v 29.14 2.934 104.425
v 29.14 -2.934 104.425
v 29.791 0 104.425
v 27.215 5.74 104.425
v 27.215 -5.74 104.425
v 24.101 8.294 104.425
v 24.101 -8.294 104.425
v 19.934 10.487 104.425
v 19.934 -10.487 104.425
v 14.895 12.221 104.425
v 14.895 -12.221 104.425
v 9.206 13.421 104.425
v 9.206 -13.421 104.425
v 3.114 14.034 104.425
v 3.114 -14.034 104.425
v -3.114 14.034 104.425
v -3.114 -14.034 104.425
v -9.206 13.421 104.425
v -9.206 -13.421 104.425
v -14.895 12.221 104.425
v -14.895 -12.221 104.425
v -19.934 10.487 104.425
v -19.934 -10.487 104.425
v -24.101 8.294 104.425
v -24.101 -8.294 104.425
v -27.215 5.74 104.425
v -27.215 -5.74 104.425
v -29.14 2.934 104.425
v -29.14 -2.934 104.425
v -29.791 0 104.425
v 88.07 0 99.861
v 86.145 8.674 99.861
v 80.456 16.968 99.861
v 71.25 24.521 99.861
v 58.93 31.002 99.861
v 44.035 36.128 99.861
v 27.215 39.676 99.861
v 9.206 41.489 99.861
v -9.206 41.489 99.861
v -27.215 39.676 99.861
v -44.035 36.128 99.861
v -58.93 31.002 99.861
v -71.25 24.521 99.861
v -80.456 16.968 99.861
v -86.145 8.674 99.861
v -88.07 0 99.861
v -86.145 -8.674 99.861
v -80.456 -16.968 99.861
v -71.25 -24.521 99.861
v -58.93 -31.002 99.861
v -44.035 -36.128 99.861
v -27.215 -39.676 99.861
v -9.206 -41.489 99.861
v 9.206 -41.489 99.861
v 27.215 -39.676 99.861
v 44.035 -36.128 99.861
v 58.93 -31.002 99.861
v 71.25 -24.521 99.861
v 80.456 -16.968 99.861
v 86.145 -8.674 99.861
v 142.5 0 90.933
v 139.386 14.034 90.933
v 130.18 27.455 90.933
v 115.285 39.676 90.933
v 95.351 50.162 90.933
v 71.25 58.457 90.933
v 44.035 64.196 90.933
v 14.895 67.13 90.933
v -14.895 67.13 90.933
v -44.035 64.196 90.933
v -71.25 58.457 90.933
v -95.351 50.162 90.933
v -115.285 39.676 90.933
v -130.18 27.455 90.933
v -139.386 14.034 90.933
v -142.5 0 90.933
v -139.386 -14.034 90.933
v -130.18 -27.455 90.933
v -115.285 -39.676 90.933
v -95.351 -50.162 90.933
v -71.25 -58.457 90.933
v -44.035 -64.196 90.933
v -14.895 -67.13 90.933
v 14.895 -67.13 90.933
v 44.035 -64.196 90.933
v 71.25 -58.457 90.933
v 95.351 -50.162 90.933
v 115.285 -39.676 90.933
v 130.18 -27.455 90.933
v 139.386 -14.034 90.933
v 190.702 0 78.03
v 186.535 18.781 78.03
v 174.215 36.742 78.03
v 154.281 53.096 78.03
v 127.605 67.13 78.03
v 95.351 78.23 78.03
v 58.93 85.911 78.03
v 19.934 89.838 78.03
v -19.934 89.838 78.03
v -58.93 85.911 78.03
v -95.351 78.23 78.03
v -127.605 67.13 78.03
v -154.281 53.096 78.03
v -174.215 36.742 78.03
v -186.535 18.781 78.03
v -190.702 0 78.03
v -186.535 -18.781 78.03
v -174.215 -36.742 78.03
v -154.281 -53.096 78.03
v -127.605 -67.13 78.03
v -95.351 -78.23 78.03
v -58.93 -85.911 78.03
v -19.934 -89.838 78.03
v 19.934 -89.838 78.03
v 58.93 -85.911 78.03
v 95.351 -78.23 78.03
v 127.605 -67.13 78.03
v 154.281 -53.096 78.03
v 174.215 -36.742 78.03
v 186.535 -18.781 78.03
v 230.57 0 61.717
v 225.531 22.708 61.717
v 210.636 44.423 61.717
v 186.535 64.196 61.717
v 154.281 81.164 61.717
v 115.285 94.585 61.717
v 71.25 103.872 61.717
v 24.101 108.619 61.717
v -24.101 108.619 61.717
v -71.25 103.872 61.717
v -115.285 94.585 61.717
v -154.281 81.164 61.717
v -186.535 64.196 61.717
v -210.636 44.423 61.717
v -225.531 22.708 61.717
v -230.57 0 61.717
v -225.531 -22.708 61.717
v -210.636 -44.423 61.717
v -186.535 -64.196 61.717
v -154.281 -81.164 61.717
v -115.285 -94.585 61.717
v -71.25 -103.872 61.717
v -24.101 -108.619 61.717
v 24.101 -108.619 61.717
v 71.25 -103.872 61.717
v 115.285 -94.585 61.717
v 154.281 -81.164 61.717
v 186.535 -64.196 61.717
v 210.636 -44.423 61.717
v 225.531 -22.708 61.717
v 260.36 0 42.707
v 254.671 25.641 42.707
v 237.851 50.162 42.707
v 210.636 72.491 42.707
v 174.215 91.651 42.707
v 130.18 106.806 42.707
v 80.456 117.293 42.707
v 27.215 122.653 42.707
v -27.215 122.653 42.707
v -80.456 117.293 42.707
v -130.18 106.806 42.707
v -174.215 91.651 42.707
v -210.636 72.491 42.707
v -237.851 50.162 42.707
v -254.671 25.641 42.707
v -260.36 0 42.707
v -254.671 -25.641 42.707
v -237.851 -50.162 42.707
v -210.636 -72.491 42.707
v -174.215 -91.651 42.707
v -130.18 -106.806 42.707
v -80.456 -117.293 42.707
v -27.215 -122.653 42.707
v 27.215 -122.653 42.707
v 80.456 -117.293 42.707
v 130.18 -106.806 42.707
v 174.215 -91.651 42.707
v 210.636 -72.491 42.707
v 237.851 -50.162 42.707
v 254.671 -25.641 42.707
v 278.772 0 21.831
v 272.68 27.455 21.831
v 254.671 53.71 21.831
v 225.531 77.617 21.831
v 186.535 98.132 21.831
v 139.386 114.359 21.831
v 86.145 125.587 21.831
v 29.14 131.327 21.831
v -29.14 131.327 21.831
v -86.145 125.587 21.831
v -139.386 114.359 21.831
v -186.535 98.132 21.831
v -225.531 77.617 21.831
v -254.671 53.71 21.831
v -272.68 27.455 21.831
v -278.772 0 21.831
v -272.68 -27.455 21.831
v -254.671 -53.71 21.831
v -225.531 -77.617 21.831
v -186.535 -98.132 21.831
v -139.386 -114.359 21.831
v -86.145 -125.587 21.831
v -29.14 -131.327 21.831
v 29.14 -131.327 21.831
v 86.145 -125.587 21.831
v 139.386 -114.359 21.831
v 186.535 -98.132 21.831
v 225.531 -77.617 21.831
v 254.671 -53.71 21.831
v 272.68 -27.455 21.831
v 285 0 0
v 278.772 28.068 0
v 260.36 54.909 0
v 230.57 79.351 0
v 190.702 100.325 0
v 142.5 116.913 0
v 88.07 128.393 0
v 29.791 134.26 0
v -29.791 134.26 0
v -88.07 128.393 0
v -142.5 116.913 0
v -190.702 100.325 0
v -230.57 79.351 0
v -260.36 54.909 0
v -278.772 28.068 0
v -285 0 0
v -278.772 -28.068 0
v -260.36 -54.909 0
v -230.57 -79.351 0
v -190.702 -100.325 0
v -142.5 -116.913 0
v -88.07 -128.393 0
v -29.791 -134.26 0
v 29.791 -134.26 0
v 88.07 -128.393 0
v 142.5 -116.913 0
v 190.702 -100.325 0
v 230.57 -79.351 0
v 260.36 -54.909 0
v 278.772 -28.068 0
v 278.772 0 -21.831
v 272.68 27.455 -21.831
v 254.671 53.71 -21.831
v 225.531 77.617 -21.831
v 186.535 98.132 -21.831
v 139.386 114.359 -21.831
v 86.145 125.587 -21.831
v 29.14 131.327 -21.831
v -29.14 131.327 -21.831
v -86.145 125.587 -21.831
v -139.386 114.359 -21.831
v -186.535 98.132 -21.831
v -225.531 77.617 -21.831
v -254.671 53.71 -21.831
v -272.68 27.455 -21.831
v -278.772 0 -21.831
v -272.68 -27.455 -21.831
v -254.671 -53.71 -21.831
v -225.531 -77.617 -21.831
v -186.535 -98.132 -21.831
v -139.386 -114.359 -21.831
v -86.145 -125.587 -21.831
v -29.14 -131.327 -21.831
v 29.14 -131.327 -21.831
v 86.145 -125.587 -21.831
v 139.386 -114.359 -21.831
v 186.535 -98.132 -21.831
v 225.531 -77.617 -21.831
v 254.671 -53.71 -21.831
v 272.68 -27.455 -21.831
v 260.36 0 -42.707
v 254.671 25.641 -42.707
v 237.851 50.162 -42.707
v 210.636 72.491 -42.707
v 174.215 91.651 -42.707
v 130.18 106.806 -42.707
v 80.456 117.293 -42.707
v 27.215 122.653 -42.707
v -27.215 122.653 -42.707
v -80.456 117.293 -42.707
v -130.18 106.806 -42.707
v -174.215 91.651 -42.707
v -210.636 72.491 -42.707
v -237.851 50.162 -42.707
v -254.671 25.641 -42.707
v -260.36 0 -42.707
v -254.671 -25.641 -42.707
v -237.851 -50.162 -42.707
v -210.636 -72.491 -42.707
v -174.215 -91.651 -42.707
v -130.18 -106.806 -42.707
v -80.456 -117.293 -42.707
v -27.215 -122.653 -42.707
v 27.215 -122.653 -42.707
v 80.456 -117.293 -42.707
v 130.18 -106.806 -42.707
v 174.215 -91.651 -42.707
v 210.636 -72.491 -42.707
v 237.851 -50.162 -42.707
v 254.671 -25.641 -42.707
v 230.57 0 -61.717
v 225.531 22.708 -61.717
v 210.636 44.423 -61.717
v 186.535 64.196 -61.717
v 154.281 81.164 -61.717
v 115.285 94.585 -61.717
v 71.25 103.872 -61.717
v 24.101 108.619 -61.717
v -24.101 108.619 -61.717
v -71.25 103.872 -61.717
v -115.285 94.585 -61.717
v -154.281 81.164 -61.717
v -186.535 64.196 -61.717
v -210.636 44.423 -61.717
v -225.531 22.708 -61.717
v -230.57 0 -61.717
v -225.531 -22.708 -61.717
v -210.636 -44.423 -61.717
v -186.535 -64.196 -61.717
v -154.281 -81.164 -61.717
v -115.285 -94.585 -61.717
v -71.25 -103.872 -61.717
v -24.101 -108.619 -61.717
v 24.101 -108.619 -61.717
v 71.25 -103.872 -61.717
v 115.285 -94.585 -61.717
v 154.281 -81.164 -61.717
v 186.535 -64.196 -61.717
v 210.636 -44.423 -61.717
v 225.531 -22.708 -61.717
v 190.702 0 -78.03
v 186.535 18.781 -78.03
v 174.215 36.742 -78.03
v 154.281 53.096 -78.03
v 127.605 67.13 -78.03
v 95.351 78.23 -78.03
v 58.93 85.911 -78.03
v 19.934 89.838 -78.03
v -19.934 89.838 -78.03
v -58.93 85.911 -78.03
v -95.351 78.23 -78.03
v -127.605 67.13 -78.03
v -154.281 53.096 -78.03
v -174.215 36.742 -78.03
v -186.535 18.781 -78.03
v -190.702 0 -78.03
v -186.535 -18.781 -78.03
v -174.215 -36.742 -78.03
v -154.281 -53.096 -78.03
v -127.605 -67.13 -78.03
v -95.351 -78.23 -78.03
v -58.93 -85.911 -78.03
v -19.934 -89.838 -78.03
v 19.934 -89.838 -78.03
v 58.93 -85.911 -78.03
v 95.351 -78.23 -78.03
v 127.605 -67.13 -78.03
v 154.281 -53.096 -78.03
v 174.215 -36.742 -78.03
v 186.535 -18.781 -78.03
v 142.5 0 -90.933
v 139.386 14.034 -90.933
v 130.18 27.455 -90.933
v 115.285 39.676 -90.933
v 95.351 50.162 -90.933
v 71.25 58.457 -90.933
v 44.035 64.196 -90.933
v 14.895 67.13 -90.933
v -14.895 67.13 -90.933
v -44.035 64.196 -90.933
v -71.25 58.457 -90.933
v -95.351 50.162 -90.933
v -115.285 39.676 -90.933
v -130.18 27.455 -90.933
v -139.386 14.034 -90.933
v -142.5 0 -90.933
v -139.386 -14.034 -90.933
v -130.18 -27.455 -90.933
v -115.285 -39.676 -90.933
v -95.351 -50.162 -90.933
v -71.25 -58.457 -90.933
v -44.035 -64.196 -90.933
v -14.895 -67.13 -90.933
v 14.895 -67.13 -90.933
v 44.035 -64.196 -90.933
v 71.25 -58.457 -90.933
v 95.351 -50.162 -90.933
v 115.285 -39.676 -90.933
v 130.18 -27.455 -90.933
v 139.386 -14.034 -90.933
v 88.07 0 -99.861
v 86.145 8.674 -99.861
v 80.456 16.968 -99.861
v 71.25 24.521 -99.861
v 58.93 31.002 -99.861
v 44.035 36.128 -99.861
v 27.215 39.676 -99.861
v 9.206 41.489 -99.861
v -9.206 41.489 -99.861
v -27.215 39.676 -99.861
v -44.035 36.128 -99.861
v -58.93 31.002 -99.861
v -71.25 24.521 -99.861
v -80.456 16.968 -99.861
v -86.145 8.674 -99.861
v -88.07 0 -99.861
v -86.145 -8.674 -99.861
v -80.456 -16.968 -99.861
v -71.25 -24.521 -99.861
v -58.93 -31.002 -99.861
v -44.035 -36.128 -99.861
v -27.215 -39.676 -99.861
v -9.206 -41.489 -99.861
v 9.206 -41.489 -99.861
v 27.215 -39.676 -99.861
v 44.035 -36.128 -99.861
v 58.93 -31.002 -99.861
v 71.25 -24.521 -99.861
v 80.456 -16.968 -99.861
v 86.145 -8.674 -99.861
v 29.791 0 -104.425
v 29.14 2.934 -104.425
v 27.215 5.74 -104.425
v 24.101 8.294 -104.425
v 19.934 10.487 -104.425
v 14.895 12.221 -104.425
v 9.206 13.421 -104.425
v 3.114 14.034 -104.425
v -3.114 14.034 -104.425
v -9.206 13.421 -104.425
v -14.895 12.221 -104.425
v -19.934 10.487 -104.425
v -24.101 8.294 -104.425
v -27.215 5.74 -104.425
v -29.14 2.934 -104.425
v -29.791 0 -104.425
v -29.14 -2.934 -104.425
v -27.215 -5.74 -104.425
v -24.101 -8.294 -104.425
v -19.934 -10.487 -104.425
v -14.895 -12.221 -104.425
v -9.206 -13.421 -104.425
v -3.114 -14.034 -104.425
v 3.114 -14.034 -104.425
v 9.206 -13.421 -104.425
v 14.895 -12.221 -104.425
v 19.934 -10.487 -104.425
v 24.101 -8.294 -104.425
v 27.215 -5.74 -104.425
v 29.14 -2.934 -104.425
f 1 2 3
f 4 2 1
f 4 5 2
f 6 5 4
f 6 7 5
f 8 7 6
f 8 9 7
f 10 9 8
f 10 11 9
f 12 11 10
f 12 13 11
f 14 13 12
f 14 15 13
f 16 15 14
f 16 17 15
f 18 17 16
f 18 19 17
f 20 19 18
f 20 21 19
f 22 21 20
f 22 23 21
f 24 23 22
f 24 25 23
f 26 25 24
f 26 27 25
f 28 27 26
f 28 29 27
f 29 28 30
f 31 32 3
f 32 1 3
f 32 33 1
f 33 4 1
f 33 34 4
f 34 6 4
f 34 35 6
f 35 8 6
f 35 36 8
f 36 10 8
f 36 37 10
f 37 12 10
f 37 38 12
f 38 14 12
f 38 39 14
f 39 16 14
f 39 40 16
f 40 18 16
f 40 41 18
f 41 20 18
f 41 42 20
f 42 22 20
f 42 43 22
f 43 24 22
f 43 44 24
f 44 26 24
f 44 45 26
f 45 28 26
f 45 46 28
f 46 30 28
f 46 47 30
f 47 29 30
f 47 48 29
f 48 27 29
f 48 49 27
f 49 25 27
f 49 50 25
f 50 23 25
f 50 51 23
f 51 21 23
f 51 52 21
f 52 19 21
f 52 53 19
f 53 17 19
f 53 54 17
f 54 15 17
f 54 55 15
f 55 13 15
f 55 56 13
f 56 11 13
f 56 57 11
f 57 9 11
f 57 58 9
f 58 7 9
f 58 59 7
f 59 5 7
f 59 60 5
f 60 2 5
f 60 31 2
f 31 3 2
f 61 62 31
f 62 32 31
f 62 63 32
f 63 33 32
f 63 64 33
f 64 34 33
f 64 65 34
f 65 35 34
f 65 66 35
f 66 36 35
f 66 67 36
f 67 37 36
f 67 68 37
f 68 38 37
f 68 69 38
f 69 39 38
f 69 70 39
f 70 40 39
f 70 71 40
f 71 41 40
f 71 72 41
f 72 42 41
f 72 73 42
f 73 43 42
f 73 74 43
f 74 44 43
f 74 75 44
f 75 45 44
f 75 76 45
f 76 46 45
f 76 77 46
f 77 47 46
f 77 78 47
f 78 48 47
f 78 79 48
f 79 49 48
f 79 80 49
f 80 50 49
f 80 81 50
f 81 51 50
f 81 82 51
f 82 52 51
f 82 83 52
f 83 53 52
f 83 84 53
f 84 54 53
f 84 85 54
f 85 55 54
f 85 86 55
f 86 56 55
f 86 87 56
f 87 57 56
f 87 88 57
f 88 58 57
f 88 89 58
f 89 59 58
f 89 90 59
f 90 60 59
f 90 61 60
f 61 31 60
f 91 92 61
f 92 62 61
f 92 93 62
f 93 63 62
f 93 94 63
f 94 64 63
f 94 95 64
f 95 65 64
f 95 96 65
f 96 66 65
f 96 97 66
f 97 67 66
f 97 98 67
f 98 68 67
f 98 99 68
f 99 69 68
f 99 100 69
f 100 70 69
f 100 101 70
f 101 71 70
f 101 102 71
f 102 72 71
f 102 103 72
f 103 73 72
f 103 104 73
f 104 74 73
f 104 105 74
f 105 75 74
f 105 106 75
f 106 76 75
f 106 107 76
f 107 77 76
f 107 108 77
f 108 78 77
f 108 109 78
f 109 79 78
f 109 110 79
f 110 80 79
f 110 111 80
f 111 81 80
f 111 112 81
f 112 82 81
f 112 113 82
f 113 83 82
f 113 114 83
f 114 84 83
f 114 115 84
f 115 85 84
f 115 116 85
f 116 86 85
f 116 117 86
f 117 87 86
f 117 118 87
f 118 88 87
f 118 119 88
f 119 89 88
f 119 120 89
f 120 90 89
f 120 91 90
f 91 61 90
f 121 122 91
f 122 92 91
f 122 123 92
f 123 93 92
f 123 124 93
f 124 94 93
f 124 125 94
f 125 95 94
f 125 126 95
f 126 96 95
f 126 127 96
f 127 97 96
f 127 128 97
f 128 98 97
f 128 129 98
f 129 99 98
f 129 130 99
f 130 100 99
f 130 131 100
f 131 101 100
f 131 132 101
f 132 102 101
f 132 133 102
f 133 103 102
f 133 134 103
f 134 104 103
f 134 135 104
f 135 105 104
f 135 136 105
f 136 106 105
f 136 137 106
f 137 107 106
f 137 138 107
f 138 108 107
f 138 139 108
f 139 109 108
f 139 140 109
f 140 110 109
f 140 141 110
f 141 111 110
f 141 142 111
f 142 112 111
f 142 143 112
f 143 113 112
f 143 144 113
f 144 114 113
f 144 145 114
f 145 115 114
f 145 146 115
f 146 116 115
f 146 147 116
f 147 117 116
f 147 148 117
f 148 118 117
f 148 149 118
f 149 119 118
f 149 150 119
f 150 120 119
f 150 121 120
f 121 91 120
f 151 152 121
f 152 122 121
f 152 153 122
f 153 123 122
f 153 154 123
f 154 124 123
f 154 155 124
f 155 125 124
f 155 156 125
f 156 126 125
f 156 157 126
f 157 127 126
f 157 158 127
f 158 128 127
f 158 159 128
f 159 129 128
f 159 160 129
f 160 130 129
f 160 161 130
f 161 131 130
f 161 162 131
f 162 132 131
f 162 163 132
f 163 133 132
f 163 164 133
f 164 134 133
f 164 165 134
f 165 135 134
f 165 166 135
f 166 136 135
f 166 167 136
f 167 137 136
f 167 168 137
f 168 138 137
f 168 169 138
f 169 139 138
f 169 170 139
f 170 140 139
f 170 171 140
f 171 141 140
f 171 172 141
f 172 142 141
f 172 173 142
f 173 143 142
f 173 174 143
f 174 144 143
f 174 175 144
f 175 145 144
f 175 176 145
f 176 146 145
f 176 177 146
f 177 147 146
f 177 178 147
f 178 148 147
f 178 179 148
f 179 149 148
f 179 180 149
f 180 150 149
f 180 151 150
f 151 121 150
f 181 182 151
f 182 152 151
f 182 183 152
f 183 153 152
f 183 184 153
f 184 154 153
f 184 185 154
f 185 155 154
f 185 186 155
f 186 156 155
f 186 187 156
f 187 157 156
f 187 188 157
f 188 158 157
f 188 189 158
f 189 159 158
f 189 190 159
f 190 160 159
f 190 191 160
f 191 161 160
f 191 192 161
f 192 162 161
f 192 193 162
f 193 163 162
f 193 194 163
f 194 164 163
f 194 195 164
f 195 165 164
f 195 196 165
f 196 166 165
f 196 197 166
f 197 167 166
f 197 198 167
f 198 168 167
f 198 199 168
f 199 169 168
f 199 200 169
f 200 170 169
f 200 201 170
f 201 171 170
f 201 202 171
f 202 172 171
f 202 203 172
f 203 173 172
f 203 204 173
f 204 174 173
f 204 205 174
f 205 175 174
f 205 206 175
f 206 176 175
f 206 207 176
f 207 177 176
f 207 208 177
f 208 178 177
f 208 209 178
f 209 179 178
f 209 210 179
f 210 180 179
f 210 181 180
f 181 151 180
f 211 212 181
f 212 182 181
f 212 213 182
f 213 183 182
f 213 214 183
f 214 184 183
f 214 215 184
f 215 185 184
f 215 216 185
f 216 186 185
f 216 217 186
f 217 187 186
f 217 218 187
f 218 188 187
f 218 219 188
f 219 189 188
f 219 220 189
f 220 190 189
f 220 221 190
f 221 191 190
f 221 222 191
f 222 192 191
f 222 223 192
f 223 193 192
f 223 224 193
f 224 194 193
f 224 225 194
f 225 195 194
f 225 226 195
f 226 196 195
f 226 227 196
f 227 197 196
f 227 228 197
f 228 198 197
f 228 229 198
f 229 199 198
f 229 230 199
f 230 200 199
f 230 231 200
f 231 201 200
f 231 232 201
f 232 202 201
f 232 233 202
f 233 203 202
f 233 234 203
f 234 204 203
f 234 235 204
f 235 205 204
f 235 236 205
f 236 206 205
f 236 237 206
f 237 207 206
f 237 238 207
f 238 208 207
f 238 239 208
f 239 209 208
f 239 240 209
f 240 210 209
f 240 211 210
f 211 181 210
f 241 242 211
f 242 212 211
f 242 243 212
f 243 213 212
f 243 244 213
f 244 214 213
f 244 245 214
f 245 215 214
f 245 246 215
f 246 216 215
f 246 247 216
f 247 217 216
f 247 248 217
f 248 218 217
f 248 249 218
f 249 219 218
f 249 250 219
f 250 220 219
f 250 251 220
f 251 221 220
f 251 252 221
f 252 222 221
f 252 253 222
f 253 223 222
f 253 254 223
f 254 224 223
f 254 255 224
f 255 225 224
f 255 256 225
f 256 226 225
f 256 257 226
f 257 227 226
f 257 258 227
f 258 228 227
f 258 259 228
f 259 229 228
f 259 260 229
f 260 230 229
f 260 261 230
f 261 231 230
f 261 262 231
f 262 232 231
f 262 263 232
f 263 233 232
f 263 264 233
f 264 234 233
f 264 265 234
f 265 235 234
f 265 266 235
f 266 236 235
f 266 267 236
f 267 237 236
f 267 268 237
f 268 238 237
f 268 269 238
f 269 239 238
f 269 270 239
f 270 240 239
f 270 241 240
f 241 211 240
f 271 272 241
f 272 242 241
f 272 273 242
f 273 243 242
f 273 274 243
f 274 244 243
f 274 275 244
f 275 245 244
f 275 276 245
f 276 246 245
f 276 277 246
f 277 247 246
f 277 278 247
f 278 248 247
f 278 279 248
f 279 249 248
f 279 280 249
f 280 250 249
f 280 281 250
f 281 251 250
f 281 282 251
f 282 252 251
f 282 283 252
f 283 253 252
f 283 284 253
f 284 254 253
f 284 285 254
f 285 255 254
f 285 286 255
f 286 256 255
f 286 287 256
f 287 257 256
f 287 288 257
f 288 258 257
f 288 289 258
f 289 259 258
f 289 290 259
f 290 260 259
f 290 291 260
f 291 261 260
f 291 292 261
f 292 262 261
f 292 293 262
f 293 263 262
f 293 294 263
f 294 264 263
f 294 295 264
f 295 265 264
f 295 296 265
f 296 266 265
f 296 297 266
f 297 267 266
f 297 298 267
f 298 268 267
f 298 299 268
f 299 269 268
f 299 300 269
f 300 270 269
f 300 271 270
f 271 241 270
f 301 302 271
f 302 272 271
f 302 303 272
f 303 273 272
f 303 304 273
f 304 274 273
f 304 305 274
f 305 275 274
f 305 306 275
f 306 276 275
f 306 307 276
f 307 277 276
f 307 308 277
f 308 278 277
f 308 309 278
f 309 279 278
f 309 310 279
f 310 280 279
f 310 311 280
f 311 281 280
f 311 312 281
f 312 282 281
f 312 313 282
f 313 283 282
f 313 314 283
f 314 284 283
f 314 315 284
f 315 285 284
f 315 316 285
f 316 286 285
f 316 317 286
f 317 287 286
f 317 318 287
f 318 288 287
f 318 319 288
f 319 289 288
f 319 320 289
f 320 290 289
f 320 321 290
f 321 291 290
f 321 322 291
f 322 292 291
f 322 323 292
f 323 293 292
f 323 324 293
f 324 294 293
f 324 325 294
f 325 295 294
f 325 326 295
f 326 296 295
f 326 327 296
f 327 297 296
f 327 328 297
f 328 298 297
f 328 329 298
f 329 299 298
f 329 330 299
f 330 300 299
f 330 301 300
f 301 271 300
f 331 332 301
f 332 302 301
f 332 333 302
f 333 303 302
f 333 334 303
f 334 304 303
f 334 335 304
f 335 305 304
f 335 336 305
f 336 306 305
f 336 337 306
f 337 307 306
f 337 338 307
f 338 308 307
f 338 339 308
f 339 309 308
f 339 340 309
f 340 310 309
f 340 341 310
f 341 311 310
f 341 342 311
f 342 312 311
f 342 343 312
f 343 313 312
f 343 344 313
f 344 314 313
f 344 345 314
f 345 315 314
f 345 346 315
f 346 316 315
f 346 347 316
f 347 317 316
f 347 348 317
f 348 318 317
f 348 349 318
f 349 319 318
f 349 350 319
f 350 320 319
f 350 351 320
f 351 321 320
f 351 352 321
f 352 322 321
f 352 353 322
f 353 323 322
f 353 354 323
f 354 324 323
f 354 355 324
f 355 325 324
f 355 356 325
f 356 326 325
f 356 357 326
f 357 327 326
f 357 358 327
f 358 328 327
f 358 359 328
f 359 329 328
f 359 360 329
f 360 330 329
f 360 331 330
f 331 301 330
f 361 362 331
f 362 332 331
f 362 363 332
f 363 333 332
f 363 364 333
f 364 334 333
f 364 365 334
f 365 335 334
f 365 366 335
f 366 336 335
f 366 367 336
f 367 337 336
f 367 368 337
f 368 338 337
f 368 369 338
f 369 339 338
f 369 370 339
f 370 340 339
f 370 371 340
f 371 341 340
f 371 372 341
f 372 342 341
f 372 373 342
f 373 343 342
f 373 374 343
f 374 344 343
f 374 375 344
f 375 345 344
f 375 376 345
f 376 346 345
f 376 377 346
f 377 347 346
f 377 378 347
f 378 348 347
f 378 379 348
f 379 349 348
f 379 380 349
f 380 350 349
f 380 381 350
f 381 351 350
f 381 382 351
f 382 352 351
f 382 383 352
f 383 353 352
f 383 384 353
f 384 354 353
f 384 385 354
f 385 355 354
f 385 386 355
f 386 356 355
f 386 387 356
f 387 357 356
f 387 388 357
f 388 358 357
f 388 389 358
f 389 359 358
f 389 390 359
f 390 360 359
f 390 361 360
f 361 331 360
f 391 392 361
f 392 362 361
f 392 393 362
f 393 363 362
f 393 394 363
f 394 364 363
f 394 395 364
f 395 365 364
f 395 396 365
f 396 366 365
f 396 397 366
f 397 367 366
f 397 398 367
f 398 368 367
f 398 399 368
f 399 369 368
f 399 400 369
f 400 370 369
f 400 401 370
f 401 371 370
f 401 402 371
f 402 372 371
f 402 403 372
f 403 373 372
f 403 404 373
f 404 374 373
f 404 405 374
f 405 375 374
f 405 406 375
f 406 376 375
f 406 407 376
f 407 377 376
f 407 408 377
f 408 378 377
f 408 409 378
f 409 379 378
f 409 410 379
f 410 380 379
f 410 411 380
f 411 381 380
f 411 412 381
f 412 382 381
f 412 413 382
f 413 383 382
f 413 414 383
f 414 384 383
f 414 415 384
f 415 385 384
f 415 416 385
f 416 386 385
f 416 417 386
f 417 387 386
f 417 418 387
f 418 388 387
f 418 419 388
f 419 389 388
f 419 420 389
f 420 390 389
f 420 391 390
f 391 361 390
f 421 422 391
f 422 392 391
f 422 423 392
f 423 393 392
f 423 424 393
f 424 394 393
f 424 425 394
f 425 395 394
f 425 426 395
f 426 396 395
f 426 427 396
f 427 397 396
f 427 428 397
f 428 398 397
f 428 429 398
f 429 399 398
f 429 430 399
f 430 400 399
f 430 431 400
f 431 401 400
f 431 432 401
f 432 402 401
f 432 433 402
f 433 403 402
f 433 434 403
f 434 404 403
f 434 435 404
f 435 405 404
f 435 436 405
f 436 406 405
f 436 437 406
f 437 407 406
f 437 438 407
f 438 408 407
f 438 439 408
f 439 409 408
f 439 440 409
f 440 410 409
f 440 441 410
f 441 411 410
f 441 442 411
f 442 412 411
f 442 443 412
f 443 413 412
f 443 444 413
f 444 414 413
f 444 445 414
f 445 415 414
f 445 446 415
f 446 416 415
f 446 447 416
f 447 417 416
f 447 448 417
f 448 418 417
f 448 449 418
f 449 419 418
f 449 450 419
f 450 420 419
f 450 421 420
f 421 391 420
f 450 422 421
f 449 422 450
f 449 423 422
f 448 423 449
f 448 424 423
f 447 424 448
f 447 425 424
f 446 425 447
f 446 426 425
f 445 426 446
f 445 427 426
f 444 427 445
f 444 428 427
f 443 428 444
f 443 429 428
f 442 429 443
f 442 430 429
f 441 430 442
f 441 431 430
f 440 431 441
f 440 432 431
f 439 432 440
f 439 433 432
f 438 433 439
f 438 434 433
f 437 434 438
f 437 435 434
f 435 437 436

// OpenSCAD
// Generated by SolidPython 1.0.1 on 2020-07-29 00:46:53


scale(v = [19, 9, 7]) {
	sphere(r = 15);
}
/***********************************************
*********      SolidPython code:      **********
************************************************
 
# import packages: SolidPython
from solid import *
from solid.utils import *
from itertools import chain, combinations, permutations


class Resize:

    def __init__(self, scad_file):
        self.scad_file = scad_file
        #self.scad_file = import_scad(scad_file)
        # cone/cylinder param:
        self.r1 = 0
        self.r2 = 0
        self.h = 0
        # rectangular prism param:
        self.w = 0
        self.l = 0
        # ellipse param:
        self.r = 0

    # import OpenScad code (file name corresponds to shape)


    # classify shape + parameters
    def assign(self, param1, param2, param3):
        if self.scad_file == 'cone.scad':
            self.r1 = param1
            self.r2 = param2
            self.h = param3
        elif self.scad_file == 'cylinder.scad':
            self.r1 = param1
            self.r2 = param2
            self.h = param3
        elif self.scad_file == 'rectangularPrism.scad':
            self.h = param1
            self.l = param2
            self.w = param3
        else:
            self.r = param1
            self.h = param2

    # resize parameters
    def iterate(self):
        x = range(3, 20, 2)
        i = 1
        if self.scad_file == 'cone.scad':
            tempList = list(permutations(x, 2))
            for temp in tempList:
                param1 = temp[0]
                param2 = temp[1]
                filepath = 'produced_scad_files/' + 'cone' + str(param1) + '_' + str(param2) + '_' + '.scad'
                scad_render_to_file(cylinder(h=param1, r1=param2, r2=0), filepath)

        elif self.scad_file == 'cylinder.scad':
            tempList = list(permutations(x, 3))
            for temp in tempList:
                param1 = temp[0]
                param2 = temp[1]
                filepath = 'produced_scad_files/' + 'cylinder' + str(param1) + '_' + str(param2) + '_' + '.scad'
                scad_render_to_file(cylinder(h=param1, r1=param2, r2=param2), filepath)

        elif self.scad_file == 'rectangularPrism.scad':
            tempList = list(permutations(x, 3))
            for temp in tempList:
                param1 = temp[0]
                param2 = temp[1]
                param3 = temp[2]
                filepath = 'produced_scad_files/' + 'rectangularPrism' + str(param1) + '_' + str(param2) + '_' + str(
                    param3) + '.scad'
                scad_render_to_file(cube(size=(param1, param2, param3)), filepath)

        elif self.scad_file == 'ellipse.scad':
            tempList = list(permutations(x, 4))
            for temp in tempList:
                param1 = temp[0]
                param2 = temp[1]
                param3 = temp[2]
                param4 = temp[3]
                filepath = 'produced_scad_files/' + 'ellipse' + str(param1) + '_' + str(param2) + '_' + str(param3) + '_' + str(param4) + '.scad'
                scad_render_to_file(scale([param1, param2, param3])(sphere(r=param4)), filepath)

    def render_to_scadfile(self):
        scad_render_to_file(scad, 'example.scad') 
 
************************************************/
